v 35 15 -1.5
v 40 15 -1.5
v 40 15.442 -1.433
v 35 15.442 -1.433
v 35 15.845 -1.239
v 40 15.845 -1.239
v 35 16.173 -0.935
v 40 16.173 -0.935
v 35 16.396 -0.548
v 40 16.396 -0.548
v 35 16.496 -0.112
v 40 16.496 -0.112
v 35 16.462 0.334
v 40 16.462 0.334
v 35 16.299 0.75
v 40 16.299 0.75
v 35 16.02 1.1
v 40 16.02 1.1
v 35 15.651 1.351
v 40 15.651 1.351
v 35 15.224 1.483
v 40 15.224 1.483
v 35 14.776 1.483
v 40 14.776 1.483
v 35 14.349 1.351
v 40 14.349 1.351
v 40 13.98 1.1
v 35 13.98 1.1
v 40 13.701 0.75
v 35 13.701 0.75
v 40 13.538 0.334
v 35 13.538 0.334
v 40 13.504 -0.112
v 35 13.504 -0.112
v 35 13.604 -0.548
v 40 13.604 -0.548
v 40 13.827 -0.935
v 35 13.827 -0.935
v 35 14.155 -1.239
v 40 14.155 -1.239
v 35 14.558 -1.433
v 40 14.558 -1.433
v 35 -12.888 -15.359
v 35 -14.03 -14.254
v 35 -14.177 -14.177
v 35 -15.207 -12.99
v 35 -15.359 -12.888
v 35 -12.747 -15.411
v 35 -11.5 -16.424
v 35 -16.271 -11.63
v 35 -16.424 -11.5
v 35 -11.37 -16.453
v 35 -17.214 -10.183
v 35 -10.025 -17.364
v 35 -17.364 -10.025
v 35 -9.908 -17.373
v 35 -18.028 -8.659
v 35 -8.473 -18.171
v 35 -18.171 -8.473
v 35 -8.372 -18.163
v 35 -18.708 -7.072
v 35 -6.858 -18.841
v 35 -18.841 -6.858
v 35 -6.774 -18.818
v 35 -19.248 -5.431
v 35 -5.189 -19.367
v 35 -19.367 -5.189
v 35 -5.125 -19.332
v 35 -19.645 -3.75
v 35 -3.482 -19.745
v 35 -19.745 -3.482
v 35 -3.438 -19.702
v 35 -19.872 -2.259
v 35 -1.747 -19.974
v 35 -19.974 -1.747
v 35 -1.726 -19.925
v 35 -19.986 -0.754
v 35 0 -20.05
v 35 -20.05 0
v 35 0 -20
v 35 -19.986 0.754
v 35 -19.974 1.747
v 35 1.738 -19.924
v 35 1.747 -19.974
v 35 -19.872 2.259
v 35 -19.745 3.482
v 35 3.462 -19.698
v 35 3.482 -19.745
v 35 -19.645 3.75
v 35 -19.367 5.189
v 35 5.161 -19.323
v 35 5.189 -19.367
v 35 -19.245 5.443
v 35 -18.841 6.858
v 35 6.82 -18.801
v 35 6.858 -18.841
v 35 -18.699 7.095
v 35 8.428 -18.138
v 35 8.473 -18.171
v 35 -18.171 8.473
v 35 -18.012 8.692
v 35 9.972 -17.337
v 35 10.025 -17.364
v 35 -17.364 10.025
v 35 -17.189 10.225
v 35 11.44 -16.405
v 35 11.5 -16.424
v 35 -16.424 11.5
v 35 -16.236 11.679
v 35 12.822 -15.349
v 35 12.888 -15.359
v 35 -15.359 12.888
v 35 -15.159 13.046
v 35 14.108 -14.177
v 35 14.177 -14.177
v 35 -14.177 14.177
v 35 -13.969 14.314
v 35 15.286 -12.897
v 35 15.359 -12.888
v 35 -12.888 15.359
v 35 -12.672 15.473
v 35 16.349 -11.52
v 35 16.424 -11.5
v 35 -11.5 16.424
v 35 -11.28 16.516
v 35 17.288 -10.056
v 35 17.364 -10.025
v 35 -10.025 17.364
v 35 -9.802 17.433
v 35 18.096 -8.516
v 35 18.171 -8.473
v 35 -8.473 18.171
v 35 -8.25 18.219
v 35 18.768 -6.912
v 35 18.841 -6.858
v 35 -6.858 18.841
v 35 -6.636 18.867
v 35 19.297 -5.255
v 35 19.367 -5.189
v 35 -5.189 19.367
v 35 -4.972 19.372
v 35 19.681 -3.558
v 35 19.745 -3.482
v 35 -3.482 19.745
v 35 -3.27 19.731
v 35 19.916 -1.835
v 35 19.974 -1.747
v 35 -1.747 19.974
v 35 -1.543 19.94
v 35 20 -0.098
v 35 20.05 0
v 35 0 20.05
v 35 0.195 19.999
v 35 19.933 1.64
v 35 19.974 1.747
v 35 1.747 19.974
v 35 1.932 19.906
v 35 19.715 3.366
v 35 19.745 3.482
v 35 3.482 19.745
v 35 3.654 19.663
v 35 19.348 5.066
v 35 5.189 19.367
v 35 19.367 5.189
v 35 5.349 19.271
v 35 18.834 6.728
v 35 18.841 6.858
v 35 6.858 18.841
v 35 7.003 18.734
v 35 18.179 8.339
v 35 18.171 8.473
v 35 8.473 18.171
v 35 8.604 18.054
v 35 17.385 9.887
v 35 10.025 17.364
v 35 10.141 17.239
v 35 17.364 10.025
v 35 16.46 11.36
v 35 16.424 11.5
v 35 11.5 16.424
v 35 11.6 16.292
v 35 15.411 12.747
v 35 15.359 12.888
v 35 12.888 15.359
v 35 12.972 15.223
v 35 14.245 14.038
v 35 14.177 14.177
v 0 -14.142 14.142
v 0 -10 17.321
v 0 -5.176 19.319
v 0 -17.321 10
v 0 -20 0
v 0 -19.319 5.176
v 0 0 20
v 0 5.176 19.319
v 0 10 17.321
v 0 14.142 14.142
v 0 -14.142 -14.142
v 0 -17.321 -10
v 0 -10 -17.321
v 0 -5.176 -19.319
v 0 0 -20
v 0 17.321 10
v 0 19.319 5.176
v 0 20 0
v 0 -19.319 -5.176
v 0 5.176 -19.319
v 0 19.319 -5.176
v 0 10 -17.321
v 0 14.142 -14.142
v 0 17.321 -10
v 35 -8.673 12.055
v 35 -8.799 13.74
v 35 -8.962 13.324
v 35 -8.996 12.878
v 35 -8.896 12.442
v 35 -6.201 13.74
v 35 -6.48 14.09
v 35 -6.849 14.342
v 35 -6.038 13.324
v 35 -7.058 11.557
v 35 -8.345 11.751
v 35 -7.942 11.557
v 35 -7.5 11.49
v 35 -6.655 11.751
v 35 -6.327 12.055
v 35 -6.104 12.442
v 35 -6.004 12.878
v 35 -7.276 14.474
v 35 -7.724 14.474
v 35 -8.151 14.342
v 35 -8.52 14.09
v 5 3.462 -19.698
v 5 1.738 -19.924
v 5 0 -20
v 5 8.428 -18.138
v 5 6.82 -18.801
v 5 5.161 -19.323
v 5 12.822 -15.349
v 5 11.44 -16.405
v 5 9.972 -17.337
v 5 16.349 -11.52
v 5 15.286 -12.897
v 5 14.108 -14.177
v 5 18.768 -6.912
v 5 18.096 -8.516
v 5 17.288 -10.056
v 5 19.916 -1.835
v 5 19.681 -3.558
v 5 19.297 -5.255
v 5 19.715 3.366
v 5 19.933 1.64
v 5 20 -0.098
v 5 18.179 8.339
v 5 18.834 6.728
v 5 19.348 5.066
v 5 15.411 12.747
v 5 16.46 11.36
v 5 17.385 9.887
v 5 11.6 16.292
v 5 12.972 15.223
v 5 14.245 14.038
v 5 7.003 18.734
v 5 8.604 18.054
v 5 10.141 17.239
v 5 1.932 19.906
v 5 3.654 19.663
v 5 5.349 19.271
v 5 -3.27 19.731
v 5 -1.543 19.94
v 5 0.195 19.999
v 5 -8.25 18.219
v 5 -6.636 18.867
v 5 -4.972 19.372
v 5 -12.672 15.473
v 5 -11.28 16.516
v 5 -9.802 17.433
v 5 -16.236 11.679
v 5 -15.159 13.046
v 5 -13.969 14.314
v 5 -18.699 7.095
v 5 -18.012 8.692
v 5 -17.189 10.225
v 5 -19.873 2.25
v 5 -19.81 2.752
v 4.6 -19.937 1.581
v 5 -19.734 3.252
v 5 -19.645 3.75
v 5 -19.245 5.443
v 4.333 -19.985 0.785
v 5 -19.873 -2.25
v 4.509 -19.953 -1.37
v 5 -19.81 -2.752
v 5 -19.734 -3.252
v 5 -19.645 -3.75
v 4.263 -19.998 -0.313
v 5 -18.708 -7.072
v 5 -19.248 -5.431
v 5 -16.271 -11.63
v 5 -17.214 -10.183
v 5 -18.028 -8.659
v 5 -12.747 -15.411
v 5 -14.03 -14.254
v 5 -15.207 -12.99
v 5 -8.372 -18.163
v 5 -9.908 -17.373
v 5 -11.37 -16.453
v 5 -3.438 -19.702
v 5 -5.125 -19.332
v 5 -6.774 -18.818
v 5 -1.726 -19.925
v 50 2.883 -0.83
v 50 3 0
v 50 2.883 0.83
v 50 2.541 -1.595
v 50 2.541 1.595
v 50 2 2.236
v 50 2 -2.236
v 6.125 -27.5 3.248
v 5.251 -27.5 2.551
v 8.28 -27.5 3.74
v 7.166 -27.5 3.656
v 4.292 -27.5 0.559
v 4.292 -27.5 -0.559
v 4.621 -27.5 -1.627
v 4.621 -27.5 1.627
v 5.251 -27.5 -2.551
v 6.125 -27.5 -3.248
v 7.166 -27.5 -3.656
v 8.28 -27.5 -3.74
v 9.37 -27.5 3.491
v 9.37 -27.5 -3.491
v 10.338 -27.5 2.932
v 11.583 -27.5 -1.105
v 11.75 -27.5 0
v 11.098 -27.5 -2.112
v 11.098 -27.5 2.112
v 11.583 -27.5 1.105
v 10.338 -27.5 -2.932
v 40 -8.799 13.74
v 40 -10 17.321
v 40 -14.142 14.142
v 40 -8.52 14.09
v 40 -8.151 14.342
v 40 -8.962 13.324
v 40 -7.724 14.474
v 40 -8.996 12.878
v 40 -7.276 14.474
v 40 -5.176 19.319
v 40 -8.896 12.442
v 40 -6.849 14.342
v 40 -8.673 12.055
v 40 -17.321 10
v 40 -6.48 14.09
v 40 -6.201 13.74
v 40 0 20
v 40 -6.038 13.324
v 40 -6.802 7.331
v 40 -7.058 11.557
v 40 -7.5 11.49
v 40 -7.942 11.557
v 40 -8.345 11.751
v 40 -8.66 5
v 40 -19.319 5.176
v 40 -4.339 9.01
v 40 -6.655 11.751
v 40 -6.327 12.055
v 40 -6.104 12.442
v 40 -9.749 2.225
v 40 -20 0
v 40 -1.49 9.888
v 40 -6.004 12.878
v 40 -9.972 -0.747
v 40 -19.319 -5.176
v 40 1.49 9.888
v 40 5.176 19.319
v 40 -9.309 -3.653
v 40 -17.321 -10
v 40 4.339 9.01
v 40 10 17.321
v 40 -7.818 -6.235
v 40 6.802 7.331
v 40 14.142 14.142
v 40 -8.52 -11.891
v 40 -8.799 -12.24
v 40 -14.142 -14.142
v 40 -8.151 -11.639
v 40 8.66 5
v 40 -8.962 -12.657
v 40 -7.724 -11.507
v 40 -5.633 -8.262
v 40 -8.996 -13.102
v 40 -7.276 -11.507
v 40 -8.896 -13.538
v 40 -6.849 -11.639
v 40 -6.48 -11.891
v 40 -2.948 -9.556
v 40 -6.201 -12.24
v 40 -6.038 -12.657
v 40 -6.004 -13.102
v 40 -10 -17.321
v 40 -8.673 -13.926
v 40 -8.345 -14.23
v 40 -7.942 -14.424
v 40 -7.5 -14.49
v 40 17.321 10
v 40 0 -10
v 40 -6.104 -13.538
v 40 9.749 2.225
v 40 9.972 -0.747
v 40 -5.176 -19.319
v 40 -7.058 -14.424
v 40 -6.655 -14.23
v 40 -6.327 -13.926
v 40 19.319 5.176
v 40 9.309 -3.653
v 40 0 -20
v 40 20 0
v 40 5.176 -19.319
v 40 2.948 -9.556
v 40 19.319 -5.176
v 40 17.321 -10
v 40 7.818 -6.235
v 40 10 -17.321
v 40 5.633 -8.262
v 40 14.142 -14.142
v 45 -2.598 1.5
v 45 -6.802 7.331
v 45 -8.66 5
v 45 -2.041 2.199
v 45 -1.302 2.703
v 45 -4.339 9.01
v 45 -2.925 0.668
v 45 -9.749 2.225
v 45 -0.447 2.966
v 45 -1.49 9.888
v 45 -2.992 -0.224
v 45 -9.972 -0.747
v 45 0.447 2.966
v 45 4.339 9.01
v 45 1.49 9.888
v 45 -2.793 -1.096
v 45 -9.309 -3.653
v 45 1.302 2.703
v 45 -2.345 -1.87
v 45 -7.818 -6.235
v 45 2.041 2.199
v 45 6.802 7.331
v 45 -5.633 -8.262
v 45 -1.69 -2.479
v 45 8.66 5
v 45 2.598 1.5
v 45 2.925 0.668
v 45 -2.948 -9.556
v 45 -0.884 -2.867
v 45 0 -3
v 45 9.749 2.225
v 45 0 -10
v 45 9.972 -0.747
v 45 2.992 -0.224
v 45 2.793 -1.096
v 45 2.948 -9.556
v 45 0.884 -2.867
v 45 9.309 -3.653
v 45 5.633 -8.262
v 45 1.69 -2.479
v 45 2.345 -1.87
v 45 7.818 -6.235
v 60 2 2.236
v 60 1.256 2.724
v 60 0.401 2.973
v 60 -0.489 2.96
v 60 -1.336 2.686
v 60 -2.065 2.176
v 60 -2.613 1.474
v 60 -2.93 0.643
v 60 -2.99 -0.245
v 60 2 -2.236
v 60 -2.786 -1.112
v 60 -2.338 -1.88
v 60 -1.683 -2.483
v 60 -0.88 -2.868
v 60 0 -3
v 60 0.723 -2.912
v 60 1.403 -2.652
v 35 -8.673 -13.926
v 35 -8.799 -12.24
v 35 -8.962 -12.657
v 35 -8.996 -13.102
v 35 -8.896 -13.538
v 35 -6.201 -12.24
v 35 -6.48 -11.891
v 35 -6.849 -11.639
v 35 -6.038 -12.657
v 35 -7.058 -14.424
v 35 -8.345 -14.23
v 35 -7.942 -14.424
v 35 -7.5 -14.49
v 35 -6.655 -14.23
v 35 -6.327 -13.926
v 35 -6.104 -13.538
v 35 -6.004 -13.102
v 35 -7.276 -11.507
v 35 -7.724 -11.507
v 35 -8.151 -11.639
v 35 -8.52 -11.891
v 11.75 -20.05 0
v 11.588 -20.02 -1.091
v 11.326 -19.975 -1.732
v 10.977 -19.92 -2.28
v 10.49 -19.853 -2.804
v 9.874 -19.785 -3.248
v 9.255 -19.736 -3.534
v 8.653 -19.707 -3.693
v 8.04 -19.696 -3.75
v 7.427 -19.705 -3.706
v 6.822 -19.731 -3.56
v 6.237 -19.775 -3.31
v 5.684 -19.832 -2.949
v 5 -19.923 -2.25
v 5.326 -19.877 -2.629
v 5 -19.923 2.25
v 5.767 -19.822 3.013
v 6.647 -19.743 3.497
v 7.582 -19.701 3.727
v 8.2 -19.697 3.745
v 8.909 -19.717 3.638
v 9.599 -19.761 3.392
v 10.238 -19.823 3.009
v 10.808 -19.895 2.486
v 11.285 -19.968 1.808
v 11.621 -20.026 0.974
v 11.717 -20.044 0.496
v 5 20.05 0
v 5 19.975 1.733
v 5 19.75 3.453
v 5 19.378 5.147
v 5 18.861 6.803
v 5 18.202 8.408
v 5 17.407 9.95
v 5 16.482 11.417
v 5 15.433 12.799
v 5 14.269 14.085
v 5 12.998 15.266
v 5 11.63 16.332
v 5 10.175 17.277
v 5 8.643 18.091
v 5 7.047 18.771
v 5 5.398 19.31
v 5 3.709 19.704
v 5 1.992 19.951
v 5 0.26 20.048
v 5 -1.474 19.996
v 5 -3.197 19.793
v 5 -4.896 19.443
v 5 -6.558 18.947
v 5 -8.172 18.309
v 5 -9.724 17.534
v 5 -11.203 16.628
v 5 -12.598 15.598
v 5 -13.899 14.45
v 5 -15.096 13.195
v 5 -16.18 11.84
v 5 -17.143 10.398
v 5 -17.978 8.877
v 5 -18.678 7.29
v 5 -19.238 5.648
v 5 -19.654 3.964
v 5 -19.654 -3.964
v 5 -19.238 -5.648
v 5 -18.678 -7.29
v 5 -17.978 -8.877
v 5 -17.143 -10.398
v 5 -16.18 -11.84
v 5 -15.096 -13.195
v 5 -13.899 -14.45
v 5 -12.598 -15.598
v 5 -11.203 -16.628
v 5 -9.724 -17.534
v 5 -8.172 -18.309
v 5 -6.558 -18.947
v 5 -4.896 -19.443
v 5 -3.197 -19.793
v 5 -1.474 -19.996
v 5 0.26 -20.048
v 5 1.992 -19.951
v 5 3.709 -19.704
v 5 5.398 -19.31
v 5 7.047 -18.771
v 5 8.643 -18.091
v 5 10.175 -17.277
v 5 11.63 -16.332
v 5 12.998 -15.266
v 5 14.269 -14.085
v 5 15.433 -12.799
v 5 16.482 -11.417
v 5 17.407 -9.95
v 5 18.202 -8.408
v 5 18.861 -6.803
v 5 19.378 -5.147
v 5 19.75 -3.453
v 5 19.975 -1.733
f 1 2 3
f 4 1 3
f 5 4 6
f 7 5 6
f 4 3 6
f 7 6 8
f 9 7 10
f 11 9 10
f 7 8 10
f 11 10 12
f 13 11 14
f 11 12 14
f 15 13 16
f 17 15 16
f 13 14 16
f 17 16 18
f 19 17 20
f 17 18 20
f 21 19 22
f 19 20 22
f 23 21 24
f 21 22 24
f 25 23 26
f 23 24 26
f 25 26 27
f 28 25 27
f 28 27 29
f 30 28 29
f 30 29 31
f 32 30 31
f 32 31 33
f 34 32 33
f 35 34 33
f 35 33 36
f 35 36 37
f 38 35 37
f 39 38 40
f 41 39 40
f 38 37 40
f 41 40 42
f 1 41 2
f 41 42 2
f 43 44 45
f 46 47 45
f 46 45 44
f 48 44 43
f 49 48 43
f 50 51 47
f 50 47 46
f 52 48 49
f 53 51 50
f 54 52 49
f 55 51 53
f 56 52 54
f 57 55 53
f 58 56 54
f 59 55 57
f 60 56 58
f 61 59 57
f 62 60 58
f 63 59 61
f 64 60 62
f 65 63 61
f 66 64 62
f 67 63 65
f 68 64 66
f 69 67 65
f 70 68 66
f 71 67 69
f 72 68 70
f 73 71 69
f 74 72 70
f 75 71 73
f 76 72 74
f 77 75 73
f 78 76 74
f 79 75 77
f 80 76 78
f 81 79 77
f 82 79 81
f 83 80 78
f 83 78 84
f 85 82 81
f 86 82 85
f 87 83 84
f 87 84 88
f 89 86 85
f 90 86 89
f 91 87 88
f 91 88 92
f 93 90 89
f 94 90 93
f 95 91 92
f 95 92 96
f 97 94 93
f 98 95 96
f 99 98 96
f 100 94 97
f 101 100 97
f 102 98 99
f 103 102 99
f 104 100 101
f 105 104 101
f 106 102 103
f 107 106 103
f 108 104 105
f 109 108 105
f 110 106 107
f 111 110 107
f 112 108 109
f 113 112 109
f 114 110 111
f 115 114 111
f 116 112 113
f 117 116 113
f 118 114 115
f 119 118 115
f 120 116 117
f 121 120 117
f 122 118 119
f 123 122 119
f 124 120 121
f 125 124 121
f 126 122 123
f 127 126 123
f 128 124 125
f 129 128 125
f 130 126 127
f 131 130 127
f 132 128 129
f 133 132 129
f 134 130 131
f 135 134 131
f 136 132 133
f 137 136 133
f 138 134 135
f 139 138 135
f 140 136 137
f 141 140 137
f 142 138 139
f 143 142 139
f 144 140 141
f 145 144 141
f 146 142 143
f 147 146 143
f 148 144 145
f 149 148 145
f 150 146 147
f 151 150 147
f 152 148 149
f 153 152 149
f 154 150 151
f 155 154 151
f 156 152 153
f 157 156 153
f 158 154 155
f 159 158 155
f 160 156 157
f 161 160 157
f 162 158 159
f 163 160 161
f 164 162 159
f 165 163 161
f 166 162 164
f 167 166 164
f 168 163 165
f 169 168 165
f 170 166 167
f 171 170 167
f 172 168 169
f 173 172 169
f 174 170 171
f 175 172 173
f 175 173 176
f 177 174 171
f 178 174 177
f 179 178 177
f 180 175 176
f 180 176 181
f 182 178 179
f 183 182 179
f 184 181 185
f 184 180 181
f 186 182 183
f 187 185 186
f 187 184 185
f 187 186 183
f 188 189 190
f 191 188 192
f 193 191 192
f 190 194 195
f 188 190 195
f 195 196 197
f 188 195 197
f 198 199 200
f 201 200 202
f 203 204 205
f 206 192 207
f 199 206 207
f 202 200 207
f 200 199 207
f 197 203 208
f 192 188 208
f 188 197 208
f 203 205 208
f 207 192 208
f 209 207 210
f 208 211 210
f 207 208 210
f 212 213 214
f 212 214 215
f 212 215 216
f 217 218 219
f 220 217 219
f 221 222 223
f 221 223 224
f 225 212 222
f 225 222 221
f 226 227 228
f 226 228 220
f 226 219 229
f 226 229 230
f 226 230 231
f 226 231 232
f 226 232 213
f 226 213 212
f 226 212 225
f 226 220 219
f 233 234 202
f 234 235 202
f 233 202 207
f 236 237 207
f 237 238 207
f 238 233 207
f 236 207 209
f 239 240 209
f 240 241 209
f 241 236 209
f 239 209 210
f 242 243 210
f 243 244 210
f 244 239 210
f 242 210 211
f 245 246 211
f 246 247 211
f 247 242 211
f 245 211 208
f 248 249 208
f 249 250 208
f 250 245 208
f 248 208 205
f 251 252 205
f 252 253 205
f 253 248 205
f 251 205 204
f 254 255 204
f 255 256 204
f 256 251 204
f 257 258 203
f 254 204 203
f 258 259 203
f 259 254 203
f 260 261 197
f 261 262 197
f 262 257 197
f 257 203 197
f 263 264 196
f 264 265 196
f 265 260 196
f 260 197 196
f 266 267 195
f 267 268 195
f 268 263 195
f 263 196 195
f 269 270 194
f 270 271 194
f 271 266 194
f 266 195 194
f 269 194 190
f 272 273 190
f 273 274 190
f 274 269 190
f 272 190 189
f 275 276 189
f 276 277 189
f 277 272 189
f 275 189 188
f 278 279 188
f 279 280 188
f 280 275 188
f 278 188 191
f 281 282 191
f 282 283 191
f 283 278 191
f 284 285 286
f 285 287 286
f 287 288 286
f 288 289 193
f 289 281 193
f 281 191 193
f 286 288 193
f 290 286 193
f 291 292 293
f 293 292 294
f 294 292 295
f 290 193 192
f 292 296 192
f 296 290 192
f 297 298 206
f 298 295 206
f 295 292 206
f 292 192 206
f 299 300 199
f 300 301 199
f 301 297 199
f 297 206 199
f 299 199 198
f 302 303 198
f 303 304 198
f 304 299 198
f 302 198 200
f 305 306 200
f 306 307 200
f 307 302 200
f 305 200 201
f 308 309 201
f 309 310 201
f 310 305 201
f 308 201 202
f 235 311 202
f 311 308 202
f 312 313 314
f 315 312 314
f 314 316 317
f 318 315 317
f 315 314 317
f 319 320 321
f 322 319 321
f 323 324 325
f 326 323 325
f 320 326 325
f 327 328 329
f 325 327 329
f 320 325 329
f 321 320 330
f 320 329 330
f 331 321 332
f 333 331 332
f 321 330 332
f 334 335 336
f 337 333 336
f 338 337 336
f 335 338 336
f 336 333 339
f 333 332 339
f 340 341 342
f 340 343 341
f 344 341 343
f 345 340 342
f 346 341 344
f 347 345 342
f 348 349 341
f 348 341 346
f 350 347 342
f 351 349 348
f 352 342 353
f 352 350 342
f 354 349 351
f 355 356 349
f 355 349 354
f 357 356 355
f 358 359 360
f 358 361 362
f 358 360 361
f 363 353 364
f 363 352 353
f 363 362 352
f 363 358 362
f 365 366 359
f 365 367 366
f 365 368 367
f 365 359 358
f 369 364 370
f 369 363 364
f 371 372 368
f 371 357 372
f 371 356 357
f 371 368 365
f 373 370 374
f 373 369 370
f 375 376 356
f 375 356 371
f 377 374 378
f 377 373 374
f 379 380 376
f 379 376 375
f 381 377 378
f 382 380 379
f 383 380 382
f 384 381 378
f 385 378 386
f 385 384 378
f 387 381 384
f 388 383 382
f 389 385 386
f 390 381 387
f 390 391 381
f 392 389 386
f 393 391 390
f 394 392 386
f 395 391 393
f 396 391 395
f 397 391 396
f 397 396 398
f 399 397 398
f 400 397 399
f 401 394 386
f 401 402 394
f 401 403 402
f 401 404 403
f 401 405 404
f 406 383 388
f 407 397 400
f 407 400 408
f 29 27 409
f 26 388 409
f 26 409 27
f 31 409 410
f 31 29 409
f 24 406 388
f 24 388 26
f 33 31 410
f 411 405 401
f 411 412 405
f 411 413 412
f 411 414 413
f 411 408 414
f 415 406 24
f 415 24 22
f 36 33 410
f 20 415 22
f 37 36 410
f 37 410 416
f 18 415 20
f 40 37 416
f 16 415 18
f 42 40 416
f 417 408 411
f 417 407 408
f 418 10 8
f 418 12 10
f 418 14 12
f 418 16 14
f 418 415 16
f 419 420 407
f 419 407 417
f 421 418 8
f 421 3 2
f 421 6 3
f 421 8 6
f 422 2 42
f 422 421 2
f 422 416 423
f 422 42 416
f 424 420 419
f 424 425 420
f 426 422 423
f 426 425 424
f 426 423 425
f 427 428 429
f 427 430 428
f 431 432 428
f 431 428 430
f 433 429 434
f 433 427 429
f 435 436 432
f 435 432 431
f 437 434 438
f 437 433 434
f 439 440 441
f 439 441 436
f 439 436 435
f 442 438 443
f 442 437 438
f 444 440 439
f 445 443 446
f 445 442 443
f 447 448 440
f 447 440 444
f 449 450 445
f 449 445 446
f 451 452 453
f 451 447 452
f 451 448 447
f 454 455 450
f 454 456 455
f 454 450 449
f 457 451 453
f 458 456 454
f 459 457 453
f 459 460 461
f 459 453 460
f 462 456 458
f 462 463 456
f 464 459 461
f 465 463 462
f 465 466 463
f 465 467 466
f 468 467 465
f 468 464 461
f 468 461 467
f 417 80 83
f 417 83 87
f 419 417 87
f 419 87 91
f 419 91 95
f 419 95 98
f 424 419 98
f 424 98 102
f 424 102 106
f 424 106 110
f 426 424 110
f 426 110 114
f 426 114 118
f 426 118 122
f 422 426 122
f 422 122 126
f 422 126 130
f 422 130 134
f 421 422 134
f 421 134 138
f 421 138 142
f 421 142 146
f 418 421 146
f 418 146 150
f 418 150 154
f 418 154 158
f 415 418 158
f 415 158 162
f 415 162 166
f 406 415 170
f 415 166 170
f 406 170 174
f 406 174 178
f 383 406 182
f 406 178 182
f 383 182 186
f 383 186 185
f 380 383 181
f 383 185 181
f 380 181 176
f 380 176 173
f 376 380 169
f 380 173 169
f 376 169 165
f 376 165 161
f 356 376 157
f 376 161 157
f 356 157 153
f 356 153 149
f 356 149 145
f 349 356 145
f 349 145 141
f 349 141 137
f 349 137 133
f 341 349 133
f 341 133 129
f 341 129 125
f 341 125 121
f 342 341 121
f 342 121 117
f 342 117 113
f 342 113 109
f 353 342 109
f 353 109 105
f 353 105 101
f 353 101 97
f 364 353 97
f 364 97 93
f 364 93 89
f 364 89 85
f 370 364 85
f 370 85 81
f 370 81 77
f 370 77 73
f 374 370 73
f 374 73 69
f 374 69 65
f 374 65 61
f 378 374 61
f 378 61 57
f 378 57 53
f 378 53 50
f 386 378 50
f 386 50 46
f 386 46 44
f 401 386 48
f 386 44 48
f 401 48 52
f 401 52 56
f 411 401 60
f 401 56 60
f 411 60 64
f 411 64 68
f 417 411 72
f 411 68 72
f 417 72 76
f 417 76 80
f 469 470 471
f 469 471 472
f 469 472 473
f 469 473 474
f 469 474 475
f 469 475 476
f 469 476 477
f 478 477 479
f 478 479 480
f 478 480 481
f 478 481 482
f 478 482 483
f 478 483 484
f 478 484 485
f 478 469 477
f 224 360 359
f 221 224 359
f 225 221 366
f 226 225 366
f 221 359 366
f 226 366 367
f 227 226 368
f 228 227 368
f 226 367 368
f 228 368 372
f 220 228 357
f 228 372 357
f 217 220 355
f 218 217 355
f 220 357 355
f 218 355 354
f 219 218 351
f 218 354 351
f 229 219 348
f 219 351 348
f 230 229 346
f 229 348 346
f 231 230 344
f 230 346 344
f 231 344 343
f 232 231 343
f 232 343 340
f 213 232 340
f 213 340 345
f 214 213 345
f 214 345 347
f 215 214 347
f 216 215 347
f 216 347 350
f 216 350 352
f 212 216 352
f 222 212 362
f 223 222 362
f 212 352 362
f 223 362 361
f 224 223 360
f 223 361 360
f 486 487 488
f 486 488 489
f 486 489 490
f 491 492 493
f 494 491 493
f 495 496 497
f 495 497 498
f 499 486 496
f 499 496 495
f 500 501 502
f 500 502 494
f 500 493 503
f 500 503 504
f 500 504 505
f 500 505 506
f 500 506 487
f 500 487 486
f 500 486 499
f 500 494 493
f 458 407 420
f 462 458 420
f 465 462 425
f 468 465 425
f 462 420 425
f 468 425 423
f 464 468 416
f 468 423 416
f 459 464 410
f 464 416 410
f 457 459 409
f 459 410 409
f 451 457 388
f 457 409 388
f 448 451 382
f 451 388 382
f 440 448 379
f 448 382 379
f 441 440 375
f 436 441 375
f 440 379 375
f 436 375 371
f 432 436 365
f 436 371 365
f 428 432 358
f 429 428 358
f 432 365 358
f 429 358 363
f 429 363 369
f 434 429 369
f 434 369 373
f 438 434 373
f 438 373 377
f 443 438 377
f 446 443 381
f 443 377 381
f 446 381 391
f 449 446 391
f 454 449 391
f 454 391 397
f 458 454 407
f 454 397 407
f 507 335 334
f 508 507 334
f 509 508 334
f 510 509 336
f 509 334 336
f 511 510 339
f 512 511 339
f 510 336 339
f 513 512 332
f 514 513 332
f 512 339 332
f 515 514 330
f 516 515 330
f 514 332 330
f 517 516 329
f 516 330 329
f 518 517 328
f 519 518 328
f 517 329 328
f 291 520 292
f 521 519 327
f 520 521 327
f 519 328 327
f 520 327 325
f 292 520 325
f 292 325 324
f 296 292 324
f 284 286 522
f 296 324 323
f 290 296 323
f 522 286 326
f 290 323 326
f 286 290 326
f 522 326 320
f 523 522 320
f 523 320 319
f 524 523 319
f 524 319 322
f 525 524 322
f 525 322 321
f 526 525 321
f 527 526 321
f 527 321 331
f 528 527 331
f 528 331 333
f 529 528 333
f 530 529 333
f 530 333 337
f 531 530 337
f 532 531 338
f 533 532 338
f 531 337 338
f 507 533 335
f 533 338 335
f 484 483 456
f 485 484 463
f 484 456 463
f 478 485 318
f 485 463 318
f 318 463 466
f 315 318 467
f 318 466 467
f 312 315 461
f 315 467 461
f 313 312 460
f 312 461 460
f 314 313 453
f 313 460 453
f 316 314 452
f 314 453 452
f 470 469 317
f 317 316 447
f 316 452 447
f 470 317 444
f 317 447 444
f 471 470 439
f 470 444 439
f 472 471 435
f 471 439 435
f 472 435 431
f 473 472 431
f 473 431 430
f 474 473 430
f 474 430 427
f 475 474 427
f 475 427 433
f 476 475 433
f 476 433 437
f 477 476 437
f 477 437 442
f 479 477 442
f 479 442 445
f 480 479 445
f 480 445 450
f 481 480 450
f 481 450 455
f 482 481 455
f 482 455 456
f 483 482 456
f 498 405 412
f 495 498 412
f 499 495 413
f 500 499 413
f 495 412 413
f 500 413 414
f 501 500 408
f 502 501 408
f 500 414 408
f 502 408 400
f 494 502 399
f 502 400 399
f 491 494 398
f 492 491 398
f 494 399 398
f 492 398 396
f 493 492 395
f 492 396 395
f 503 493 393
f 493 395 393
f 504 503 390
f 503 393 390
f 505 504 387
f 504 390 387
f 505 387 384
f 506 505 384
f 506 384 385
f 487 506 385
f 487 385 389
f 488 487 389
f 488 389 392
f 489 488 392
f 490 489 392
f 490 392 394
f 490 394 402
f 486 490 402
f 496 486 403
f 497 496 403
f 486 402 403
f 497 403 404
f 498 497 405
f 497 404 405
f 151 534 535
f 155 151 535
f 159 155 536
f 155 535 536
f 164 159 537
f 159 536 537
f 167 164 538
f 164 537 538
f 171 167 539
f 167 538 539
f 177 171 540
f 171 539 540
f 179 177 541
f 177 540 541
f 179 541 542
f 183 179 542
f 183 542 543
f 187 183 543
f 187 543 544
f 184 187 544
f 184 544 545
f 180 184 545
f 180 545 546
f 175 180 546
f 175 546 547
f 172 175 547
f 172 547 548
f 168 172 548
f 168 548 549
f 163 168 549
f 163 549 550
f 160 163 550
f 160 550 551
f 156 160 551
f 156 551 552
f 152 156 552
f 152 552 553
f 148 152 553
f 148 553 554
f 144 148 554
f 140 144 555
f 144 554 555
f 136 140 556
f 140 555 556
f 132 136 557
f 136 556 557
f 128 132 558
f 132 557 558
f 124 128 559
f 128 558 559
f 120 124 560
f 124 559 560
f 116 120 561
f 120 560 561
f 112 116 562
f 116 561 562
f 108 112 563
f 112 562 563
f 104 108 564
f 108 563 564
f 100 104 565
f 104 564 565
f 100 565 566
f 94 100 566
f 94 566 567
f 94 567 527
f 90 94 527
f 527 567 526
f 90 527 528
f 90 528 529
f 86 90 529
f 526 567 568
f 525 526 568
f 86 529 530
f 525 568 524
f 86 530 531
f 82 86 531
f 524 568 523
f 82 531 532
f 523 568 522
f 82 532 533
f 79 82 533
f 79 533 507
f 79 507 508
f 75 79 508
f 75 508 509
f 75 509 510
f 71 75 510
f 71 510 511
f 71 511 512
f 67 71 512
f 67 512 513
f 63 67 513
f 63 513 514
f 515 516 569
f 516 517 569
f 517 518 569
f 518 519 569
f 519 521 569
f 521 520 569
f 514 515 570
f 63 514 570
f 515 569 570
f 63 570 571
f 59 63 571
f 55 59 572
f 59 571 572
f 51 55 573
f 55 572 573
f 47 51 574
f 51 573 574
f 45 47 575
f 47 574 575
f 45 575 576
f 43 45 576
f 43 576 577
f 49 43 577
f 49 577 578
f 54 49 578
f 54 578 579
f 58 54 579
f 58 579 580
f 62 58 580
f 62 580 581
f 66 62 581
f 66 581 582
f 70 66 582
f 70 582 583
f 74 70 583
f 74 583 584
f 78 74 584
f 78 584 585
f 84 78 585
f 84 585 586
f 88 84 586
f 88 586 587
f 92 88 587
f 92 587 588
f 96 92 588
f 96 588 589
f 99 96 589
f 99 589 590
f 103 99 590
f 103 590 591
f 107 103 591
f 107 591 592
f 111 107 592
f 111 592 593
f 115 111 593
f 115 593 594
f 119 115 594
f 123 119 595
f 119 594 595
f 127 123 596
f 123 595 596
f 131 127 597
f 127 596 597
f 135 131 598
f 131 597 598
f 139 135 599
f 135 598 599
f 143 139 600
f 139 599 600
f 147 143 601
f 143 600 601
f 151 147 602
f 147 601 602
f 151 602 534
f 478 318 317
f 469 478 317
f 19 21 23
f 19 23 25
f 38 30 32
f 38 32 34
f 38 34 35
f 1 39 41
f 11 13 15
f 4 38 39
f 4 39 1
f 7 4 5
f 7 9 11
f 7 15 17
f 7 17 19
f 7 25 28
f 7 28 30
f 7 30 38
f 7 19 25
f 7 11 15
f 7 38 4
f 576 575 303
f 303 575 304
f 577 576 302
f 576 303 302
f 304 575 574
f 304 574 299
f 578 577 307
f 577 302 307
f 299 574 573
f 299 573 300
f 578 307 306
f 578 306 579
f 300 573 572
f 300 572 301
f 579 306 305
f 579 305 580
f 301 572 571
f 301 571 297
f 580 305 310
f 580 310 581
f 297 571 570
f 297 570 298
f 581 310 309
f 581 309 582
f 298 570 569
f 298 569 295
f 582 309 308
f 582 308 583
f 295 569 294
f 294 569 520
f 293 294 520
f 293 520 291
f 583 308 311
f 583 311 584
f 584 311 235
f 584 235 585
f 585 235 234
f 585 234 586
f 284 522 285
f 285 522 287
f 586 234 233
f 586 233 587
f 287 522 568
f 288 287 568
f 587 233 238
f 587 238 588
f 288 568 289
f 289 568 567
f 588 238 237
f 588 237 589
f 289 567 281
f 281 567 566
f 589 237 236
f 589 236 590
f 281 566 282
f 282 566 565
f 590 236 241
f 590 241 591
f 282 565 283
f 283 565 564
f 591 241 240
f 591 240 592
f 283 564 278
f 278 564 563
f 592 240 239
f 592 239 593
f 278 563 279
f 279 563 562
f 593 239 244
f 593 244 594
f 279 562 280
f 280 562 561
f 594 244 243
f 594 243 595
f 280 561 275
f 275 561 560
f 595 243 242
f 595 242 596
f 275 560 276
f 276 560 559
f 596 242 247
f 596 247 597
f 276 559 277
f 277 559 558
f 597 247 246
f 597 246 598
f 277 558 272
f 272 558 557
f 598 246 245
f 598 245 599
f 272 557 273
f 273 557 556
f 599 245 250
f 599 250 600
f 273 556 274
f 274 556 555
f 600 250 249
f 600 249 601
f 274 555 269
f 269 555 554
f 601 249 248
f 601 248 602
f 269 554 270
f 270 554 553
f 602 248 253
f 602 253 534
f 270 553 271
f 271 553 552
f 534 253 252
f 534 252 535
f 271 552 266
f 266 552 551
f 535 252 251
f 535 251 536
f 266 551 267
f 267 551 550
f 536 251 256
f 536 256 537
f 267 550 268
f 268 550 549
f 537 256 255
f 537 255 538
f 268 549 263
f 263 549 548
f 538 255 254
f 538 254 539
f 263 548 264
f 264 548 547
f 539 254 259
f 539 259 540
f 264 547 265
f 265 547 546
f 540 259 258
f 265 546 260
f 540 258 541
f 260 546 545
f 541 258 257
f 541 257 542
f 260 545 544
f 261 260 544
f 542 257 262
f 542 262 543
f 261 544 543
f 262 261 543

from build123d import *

# Parameters (mm, degrees)
CROQUIS1_R                  = 20
SALIENTE_EXTRUIR1_DEPTH     = 40
CROQUIS2_R                  = 10
SALIENTE_EXTRUIR2_DEPTH     = 5
CROQUIS4_R                  = 1.5
CORTAR_EXTRUIR1_DEPTH       = 5
CROQUIS5_R                  = 3
SALIENTE_EXTRUIR3_DEPTH     = 15
CORTAR_EXTRUIR2_START       = -10
CORTAR_EXTRUIR2_DEPTH       = 10
SALIENTE_EXTRUIR4_START     = -27.5
SALIENTE_EXTRUIR4_OUTLINE_R = 3.75
SALIENTE_EXTRUIR4_DEPTH     = 7.854707334
SALIENTE_EXTRUIR4_START_2   = 3
SALIENTE_EXTRUIR4_2_DEPTH   = 10
SALIENTE_EXTRUIR6_START     = 5
SALIENTE_EXTRUIR6_OUTLINE_R = 20.05
SALIENTE_EXTRUIR6_DEPTH     = 30


with BuildPart() as part:
    # Croquis1 → Saliente-Extruir1 (new body)
    with BuildSketch(Plane(origin=(0, 0, 0), x_dir=(0, 0, -1), z_dir=(1, 0, 0))):
        Circle(CROQUIS1_R)
    extrude(amount=SALIENTE_EXTRUIR1_DEPTH)

    # Croquis2 → Saliente-Extruir2 (add)
    with BuildSketch(Plane(origin=(40, 0, 0), x_dir=(0, 0, -1), z_dir=(1, 0, 0))):
        Circle(CROQUIS2_R)
    extrude(amount=SALIENTE_EXTRUIR2_DEPTH)

    # Croquis4 → Cortar-Extruir1 (cut)
    with BuildSketch(Plane(origin=(40, 0, 0), x_dir=(0, 0, -1), z_dir=(1, 0, 0))):
        with Locations((0, 15)):
            Circle(CROQUIS4_R)
        with Locations((12.990381057, -7.5)):
            Circle(CROQUIS4_R)
        with Locations((-12.990381057, -7.5)):
            Circle(CROQUIS4_R)
    extrude(amount=-CORTAR_EXTRUIR1_DEPTH, mode=Mode.SUBTRACT)

    # Croquis5 → Saliente-Extruir3 (add)
    with BuildSketch(Plane(origin=(45, 0, 0), x_dir=(0, 0, -1), z_dir=(1, 0, 0))):
        Circle(CROQUIS5_R)
    extrude(amount=SALIENTE_EXTRUIR3_DEPTH)

    # Croquis6 → Cortar-Extruir2 (cut)
    with BuildSketch(Plane(origin=(60, 0, 0), x_dir=(0, 0, -1), z_dir=(1, 0, 0)).offset(CORTAR_EXTRUIR2_START)):
        with BuildLine():
            Line((0, 2), (-2.236067977, 2))
            ThreePointArc((-2.236067977, 2), (0, 3), (2.236067977, 2))
            Line((2.236067977, 2), (0, 2))
        make_face()
    extrude(amount=CORTAR_EXTRUIR2_DEPTH, mode=Mode.SUBTRACT)



with BuildPart() as body_2:
    # Saliente-Extruir4: read off the stored shape, not the designer's step
    # Saliente-Extruir4 outline → Saliente-Extruir4 (new body)
    with BuildSketch(Plane(origin=(0, 0, 0), x_dir=(1, 0, 0), z_dir=(0, 1, 0)).offset(SALIENTE_EXTRUIR4_START)):
        with Locations((8, 0)):
            Circle(SALIENTE_EXTRUIR4_OUTLINE_R)
    extrude(amount=SALIENTE_EXTRUIR4_DEPTH)

    # Saliente-Extruir4 2 outline → Saliente-Extruir4 2 (cut)
    with BuildSketch(Plane.YZ.offset(SALIENTE_EXTRUIR4_START_2)):
        with BuildLine():
            ThreePointArc((-19.645292078, 3.749999888), (-20, 0), (-19.645292078, -3.749999888))
            Line((-19.645292078, -3.749999888), (-19.645292078, 3.749999888))
        make_face()
    extrude(amount=SALIENTE_EXTRUIR4_2_DEPTH, mode=Mode.SUBTRACT)


with BuildPart() as part_1:
    add(part.part)

    add(body_2.part)  # Saliente-Extruir6 merges body 2
    # Saliente-Extruir6: read off the stored shape, not the designer's step
    # Saliente-Extruir6 outline → Saliente-Extruir6 (add)
    with BuildSketch(Plane.YZ.offset(SALIENTE_EXTRUIR6_START)):
        Circle(SALIENTE_EXTRUIR6_OUTLINE_R)
        with BuildLine():
            ThreePointArc((-19.645240114, 3.750272106), (20, -7.213e-06), (-19.645242819, -3.750257935))
            ThreePointArc((-19.645242819, -3.750257935), (-20, 7.213e-06), (-19.645240114, 3.750272106))
        make_face(mode=Mode.SUBTRACT)
    extrude(amount=SALIENTE_EXTRUIR6_DEPTH)


solid = part_1.part
